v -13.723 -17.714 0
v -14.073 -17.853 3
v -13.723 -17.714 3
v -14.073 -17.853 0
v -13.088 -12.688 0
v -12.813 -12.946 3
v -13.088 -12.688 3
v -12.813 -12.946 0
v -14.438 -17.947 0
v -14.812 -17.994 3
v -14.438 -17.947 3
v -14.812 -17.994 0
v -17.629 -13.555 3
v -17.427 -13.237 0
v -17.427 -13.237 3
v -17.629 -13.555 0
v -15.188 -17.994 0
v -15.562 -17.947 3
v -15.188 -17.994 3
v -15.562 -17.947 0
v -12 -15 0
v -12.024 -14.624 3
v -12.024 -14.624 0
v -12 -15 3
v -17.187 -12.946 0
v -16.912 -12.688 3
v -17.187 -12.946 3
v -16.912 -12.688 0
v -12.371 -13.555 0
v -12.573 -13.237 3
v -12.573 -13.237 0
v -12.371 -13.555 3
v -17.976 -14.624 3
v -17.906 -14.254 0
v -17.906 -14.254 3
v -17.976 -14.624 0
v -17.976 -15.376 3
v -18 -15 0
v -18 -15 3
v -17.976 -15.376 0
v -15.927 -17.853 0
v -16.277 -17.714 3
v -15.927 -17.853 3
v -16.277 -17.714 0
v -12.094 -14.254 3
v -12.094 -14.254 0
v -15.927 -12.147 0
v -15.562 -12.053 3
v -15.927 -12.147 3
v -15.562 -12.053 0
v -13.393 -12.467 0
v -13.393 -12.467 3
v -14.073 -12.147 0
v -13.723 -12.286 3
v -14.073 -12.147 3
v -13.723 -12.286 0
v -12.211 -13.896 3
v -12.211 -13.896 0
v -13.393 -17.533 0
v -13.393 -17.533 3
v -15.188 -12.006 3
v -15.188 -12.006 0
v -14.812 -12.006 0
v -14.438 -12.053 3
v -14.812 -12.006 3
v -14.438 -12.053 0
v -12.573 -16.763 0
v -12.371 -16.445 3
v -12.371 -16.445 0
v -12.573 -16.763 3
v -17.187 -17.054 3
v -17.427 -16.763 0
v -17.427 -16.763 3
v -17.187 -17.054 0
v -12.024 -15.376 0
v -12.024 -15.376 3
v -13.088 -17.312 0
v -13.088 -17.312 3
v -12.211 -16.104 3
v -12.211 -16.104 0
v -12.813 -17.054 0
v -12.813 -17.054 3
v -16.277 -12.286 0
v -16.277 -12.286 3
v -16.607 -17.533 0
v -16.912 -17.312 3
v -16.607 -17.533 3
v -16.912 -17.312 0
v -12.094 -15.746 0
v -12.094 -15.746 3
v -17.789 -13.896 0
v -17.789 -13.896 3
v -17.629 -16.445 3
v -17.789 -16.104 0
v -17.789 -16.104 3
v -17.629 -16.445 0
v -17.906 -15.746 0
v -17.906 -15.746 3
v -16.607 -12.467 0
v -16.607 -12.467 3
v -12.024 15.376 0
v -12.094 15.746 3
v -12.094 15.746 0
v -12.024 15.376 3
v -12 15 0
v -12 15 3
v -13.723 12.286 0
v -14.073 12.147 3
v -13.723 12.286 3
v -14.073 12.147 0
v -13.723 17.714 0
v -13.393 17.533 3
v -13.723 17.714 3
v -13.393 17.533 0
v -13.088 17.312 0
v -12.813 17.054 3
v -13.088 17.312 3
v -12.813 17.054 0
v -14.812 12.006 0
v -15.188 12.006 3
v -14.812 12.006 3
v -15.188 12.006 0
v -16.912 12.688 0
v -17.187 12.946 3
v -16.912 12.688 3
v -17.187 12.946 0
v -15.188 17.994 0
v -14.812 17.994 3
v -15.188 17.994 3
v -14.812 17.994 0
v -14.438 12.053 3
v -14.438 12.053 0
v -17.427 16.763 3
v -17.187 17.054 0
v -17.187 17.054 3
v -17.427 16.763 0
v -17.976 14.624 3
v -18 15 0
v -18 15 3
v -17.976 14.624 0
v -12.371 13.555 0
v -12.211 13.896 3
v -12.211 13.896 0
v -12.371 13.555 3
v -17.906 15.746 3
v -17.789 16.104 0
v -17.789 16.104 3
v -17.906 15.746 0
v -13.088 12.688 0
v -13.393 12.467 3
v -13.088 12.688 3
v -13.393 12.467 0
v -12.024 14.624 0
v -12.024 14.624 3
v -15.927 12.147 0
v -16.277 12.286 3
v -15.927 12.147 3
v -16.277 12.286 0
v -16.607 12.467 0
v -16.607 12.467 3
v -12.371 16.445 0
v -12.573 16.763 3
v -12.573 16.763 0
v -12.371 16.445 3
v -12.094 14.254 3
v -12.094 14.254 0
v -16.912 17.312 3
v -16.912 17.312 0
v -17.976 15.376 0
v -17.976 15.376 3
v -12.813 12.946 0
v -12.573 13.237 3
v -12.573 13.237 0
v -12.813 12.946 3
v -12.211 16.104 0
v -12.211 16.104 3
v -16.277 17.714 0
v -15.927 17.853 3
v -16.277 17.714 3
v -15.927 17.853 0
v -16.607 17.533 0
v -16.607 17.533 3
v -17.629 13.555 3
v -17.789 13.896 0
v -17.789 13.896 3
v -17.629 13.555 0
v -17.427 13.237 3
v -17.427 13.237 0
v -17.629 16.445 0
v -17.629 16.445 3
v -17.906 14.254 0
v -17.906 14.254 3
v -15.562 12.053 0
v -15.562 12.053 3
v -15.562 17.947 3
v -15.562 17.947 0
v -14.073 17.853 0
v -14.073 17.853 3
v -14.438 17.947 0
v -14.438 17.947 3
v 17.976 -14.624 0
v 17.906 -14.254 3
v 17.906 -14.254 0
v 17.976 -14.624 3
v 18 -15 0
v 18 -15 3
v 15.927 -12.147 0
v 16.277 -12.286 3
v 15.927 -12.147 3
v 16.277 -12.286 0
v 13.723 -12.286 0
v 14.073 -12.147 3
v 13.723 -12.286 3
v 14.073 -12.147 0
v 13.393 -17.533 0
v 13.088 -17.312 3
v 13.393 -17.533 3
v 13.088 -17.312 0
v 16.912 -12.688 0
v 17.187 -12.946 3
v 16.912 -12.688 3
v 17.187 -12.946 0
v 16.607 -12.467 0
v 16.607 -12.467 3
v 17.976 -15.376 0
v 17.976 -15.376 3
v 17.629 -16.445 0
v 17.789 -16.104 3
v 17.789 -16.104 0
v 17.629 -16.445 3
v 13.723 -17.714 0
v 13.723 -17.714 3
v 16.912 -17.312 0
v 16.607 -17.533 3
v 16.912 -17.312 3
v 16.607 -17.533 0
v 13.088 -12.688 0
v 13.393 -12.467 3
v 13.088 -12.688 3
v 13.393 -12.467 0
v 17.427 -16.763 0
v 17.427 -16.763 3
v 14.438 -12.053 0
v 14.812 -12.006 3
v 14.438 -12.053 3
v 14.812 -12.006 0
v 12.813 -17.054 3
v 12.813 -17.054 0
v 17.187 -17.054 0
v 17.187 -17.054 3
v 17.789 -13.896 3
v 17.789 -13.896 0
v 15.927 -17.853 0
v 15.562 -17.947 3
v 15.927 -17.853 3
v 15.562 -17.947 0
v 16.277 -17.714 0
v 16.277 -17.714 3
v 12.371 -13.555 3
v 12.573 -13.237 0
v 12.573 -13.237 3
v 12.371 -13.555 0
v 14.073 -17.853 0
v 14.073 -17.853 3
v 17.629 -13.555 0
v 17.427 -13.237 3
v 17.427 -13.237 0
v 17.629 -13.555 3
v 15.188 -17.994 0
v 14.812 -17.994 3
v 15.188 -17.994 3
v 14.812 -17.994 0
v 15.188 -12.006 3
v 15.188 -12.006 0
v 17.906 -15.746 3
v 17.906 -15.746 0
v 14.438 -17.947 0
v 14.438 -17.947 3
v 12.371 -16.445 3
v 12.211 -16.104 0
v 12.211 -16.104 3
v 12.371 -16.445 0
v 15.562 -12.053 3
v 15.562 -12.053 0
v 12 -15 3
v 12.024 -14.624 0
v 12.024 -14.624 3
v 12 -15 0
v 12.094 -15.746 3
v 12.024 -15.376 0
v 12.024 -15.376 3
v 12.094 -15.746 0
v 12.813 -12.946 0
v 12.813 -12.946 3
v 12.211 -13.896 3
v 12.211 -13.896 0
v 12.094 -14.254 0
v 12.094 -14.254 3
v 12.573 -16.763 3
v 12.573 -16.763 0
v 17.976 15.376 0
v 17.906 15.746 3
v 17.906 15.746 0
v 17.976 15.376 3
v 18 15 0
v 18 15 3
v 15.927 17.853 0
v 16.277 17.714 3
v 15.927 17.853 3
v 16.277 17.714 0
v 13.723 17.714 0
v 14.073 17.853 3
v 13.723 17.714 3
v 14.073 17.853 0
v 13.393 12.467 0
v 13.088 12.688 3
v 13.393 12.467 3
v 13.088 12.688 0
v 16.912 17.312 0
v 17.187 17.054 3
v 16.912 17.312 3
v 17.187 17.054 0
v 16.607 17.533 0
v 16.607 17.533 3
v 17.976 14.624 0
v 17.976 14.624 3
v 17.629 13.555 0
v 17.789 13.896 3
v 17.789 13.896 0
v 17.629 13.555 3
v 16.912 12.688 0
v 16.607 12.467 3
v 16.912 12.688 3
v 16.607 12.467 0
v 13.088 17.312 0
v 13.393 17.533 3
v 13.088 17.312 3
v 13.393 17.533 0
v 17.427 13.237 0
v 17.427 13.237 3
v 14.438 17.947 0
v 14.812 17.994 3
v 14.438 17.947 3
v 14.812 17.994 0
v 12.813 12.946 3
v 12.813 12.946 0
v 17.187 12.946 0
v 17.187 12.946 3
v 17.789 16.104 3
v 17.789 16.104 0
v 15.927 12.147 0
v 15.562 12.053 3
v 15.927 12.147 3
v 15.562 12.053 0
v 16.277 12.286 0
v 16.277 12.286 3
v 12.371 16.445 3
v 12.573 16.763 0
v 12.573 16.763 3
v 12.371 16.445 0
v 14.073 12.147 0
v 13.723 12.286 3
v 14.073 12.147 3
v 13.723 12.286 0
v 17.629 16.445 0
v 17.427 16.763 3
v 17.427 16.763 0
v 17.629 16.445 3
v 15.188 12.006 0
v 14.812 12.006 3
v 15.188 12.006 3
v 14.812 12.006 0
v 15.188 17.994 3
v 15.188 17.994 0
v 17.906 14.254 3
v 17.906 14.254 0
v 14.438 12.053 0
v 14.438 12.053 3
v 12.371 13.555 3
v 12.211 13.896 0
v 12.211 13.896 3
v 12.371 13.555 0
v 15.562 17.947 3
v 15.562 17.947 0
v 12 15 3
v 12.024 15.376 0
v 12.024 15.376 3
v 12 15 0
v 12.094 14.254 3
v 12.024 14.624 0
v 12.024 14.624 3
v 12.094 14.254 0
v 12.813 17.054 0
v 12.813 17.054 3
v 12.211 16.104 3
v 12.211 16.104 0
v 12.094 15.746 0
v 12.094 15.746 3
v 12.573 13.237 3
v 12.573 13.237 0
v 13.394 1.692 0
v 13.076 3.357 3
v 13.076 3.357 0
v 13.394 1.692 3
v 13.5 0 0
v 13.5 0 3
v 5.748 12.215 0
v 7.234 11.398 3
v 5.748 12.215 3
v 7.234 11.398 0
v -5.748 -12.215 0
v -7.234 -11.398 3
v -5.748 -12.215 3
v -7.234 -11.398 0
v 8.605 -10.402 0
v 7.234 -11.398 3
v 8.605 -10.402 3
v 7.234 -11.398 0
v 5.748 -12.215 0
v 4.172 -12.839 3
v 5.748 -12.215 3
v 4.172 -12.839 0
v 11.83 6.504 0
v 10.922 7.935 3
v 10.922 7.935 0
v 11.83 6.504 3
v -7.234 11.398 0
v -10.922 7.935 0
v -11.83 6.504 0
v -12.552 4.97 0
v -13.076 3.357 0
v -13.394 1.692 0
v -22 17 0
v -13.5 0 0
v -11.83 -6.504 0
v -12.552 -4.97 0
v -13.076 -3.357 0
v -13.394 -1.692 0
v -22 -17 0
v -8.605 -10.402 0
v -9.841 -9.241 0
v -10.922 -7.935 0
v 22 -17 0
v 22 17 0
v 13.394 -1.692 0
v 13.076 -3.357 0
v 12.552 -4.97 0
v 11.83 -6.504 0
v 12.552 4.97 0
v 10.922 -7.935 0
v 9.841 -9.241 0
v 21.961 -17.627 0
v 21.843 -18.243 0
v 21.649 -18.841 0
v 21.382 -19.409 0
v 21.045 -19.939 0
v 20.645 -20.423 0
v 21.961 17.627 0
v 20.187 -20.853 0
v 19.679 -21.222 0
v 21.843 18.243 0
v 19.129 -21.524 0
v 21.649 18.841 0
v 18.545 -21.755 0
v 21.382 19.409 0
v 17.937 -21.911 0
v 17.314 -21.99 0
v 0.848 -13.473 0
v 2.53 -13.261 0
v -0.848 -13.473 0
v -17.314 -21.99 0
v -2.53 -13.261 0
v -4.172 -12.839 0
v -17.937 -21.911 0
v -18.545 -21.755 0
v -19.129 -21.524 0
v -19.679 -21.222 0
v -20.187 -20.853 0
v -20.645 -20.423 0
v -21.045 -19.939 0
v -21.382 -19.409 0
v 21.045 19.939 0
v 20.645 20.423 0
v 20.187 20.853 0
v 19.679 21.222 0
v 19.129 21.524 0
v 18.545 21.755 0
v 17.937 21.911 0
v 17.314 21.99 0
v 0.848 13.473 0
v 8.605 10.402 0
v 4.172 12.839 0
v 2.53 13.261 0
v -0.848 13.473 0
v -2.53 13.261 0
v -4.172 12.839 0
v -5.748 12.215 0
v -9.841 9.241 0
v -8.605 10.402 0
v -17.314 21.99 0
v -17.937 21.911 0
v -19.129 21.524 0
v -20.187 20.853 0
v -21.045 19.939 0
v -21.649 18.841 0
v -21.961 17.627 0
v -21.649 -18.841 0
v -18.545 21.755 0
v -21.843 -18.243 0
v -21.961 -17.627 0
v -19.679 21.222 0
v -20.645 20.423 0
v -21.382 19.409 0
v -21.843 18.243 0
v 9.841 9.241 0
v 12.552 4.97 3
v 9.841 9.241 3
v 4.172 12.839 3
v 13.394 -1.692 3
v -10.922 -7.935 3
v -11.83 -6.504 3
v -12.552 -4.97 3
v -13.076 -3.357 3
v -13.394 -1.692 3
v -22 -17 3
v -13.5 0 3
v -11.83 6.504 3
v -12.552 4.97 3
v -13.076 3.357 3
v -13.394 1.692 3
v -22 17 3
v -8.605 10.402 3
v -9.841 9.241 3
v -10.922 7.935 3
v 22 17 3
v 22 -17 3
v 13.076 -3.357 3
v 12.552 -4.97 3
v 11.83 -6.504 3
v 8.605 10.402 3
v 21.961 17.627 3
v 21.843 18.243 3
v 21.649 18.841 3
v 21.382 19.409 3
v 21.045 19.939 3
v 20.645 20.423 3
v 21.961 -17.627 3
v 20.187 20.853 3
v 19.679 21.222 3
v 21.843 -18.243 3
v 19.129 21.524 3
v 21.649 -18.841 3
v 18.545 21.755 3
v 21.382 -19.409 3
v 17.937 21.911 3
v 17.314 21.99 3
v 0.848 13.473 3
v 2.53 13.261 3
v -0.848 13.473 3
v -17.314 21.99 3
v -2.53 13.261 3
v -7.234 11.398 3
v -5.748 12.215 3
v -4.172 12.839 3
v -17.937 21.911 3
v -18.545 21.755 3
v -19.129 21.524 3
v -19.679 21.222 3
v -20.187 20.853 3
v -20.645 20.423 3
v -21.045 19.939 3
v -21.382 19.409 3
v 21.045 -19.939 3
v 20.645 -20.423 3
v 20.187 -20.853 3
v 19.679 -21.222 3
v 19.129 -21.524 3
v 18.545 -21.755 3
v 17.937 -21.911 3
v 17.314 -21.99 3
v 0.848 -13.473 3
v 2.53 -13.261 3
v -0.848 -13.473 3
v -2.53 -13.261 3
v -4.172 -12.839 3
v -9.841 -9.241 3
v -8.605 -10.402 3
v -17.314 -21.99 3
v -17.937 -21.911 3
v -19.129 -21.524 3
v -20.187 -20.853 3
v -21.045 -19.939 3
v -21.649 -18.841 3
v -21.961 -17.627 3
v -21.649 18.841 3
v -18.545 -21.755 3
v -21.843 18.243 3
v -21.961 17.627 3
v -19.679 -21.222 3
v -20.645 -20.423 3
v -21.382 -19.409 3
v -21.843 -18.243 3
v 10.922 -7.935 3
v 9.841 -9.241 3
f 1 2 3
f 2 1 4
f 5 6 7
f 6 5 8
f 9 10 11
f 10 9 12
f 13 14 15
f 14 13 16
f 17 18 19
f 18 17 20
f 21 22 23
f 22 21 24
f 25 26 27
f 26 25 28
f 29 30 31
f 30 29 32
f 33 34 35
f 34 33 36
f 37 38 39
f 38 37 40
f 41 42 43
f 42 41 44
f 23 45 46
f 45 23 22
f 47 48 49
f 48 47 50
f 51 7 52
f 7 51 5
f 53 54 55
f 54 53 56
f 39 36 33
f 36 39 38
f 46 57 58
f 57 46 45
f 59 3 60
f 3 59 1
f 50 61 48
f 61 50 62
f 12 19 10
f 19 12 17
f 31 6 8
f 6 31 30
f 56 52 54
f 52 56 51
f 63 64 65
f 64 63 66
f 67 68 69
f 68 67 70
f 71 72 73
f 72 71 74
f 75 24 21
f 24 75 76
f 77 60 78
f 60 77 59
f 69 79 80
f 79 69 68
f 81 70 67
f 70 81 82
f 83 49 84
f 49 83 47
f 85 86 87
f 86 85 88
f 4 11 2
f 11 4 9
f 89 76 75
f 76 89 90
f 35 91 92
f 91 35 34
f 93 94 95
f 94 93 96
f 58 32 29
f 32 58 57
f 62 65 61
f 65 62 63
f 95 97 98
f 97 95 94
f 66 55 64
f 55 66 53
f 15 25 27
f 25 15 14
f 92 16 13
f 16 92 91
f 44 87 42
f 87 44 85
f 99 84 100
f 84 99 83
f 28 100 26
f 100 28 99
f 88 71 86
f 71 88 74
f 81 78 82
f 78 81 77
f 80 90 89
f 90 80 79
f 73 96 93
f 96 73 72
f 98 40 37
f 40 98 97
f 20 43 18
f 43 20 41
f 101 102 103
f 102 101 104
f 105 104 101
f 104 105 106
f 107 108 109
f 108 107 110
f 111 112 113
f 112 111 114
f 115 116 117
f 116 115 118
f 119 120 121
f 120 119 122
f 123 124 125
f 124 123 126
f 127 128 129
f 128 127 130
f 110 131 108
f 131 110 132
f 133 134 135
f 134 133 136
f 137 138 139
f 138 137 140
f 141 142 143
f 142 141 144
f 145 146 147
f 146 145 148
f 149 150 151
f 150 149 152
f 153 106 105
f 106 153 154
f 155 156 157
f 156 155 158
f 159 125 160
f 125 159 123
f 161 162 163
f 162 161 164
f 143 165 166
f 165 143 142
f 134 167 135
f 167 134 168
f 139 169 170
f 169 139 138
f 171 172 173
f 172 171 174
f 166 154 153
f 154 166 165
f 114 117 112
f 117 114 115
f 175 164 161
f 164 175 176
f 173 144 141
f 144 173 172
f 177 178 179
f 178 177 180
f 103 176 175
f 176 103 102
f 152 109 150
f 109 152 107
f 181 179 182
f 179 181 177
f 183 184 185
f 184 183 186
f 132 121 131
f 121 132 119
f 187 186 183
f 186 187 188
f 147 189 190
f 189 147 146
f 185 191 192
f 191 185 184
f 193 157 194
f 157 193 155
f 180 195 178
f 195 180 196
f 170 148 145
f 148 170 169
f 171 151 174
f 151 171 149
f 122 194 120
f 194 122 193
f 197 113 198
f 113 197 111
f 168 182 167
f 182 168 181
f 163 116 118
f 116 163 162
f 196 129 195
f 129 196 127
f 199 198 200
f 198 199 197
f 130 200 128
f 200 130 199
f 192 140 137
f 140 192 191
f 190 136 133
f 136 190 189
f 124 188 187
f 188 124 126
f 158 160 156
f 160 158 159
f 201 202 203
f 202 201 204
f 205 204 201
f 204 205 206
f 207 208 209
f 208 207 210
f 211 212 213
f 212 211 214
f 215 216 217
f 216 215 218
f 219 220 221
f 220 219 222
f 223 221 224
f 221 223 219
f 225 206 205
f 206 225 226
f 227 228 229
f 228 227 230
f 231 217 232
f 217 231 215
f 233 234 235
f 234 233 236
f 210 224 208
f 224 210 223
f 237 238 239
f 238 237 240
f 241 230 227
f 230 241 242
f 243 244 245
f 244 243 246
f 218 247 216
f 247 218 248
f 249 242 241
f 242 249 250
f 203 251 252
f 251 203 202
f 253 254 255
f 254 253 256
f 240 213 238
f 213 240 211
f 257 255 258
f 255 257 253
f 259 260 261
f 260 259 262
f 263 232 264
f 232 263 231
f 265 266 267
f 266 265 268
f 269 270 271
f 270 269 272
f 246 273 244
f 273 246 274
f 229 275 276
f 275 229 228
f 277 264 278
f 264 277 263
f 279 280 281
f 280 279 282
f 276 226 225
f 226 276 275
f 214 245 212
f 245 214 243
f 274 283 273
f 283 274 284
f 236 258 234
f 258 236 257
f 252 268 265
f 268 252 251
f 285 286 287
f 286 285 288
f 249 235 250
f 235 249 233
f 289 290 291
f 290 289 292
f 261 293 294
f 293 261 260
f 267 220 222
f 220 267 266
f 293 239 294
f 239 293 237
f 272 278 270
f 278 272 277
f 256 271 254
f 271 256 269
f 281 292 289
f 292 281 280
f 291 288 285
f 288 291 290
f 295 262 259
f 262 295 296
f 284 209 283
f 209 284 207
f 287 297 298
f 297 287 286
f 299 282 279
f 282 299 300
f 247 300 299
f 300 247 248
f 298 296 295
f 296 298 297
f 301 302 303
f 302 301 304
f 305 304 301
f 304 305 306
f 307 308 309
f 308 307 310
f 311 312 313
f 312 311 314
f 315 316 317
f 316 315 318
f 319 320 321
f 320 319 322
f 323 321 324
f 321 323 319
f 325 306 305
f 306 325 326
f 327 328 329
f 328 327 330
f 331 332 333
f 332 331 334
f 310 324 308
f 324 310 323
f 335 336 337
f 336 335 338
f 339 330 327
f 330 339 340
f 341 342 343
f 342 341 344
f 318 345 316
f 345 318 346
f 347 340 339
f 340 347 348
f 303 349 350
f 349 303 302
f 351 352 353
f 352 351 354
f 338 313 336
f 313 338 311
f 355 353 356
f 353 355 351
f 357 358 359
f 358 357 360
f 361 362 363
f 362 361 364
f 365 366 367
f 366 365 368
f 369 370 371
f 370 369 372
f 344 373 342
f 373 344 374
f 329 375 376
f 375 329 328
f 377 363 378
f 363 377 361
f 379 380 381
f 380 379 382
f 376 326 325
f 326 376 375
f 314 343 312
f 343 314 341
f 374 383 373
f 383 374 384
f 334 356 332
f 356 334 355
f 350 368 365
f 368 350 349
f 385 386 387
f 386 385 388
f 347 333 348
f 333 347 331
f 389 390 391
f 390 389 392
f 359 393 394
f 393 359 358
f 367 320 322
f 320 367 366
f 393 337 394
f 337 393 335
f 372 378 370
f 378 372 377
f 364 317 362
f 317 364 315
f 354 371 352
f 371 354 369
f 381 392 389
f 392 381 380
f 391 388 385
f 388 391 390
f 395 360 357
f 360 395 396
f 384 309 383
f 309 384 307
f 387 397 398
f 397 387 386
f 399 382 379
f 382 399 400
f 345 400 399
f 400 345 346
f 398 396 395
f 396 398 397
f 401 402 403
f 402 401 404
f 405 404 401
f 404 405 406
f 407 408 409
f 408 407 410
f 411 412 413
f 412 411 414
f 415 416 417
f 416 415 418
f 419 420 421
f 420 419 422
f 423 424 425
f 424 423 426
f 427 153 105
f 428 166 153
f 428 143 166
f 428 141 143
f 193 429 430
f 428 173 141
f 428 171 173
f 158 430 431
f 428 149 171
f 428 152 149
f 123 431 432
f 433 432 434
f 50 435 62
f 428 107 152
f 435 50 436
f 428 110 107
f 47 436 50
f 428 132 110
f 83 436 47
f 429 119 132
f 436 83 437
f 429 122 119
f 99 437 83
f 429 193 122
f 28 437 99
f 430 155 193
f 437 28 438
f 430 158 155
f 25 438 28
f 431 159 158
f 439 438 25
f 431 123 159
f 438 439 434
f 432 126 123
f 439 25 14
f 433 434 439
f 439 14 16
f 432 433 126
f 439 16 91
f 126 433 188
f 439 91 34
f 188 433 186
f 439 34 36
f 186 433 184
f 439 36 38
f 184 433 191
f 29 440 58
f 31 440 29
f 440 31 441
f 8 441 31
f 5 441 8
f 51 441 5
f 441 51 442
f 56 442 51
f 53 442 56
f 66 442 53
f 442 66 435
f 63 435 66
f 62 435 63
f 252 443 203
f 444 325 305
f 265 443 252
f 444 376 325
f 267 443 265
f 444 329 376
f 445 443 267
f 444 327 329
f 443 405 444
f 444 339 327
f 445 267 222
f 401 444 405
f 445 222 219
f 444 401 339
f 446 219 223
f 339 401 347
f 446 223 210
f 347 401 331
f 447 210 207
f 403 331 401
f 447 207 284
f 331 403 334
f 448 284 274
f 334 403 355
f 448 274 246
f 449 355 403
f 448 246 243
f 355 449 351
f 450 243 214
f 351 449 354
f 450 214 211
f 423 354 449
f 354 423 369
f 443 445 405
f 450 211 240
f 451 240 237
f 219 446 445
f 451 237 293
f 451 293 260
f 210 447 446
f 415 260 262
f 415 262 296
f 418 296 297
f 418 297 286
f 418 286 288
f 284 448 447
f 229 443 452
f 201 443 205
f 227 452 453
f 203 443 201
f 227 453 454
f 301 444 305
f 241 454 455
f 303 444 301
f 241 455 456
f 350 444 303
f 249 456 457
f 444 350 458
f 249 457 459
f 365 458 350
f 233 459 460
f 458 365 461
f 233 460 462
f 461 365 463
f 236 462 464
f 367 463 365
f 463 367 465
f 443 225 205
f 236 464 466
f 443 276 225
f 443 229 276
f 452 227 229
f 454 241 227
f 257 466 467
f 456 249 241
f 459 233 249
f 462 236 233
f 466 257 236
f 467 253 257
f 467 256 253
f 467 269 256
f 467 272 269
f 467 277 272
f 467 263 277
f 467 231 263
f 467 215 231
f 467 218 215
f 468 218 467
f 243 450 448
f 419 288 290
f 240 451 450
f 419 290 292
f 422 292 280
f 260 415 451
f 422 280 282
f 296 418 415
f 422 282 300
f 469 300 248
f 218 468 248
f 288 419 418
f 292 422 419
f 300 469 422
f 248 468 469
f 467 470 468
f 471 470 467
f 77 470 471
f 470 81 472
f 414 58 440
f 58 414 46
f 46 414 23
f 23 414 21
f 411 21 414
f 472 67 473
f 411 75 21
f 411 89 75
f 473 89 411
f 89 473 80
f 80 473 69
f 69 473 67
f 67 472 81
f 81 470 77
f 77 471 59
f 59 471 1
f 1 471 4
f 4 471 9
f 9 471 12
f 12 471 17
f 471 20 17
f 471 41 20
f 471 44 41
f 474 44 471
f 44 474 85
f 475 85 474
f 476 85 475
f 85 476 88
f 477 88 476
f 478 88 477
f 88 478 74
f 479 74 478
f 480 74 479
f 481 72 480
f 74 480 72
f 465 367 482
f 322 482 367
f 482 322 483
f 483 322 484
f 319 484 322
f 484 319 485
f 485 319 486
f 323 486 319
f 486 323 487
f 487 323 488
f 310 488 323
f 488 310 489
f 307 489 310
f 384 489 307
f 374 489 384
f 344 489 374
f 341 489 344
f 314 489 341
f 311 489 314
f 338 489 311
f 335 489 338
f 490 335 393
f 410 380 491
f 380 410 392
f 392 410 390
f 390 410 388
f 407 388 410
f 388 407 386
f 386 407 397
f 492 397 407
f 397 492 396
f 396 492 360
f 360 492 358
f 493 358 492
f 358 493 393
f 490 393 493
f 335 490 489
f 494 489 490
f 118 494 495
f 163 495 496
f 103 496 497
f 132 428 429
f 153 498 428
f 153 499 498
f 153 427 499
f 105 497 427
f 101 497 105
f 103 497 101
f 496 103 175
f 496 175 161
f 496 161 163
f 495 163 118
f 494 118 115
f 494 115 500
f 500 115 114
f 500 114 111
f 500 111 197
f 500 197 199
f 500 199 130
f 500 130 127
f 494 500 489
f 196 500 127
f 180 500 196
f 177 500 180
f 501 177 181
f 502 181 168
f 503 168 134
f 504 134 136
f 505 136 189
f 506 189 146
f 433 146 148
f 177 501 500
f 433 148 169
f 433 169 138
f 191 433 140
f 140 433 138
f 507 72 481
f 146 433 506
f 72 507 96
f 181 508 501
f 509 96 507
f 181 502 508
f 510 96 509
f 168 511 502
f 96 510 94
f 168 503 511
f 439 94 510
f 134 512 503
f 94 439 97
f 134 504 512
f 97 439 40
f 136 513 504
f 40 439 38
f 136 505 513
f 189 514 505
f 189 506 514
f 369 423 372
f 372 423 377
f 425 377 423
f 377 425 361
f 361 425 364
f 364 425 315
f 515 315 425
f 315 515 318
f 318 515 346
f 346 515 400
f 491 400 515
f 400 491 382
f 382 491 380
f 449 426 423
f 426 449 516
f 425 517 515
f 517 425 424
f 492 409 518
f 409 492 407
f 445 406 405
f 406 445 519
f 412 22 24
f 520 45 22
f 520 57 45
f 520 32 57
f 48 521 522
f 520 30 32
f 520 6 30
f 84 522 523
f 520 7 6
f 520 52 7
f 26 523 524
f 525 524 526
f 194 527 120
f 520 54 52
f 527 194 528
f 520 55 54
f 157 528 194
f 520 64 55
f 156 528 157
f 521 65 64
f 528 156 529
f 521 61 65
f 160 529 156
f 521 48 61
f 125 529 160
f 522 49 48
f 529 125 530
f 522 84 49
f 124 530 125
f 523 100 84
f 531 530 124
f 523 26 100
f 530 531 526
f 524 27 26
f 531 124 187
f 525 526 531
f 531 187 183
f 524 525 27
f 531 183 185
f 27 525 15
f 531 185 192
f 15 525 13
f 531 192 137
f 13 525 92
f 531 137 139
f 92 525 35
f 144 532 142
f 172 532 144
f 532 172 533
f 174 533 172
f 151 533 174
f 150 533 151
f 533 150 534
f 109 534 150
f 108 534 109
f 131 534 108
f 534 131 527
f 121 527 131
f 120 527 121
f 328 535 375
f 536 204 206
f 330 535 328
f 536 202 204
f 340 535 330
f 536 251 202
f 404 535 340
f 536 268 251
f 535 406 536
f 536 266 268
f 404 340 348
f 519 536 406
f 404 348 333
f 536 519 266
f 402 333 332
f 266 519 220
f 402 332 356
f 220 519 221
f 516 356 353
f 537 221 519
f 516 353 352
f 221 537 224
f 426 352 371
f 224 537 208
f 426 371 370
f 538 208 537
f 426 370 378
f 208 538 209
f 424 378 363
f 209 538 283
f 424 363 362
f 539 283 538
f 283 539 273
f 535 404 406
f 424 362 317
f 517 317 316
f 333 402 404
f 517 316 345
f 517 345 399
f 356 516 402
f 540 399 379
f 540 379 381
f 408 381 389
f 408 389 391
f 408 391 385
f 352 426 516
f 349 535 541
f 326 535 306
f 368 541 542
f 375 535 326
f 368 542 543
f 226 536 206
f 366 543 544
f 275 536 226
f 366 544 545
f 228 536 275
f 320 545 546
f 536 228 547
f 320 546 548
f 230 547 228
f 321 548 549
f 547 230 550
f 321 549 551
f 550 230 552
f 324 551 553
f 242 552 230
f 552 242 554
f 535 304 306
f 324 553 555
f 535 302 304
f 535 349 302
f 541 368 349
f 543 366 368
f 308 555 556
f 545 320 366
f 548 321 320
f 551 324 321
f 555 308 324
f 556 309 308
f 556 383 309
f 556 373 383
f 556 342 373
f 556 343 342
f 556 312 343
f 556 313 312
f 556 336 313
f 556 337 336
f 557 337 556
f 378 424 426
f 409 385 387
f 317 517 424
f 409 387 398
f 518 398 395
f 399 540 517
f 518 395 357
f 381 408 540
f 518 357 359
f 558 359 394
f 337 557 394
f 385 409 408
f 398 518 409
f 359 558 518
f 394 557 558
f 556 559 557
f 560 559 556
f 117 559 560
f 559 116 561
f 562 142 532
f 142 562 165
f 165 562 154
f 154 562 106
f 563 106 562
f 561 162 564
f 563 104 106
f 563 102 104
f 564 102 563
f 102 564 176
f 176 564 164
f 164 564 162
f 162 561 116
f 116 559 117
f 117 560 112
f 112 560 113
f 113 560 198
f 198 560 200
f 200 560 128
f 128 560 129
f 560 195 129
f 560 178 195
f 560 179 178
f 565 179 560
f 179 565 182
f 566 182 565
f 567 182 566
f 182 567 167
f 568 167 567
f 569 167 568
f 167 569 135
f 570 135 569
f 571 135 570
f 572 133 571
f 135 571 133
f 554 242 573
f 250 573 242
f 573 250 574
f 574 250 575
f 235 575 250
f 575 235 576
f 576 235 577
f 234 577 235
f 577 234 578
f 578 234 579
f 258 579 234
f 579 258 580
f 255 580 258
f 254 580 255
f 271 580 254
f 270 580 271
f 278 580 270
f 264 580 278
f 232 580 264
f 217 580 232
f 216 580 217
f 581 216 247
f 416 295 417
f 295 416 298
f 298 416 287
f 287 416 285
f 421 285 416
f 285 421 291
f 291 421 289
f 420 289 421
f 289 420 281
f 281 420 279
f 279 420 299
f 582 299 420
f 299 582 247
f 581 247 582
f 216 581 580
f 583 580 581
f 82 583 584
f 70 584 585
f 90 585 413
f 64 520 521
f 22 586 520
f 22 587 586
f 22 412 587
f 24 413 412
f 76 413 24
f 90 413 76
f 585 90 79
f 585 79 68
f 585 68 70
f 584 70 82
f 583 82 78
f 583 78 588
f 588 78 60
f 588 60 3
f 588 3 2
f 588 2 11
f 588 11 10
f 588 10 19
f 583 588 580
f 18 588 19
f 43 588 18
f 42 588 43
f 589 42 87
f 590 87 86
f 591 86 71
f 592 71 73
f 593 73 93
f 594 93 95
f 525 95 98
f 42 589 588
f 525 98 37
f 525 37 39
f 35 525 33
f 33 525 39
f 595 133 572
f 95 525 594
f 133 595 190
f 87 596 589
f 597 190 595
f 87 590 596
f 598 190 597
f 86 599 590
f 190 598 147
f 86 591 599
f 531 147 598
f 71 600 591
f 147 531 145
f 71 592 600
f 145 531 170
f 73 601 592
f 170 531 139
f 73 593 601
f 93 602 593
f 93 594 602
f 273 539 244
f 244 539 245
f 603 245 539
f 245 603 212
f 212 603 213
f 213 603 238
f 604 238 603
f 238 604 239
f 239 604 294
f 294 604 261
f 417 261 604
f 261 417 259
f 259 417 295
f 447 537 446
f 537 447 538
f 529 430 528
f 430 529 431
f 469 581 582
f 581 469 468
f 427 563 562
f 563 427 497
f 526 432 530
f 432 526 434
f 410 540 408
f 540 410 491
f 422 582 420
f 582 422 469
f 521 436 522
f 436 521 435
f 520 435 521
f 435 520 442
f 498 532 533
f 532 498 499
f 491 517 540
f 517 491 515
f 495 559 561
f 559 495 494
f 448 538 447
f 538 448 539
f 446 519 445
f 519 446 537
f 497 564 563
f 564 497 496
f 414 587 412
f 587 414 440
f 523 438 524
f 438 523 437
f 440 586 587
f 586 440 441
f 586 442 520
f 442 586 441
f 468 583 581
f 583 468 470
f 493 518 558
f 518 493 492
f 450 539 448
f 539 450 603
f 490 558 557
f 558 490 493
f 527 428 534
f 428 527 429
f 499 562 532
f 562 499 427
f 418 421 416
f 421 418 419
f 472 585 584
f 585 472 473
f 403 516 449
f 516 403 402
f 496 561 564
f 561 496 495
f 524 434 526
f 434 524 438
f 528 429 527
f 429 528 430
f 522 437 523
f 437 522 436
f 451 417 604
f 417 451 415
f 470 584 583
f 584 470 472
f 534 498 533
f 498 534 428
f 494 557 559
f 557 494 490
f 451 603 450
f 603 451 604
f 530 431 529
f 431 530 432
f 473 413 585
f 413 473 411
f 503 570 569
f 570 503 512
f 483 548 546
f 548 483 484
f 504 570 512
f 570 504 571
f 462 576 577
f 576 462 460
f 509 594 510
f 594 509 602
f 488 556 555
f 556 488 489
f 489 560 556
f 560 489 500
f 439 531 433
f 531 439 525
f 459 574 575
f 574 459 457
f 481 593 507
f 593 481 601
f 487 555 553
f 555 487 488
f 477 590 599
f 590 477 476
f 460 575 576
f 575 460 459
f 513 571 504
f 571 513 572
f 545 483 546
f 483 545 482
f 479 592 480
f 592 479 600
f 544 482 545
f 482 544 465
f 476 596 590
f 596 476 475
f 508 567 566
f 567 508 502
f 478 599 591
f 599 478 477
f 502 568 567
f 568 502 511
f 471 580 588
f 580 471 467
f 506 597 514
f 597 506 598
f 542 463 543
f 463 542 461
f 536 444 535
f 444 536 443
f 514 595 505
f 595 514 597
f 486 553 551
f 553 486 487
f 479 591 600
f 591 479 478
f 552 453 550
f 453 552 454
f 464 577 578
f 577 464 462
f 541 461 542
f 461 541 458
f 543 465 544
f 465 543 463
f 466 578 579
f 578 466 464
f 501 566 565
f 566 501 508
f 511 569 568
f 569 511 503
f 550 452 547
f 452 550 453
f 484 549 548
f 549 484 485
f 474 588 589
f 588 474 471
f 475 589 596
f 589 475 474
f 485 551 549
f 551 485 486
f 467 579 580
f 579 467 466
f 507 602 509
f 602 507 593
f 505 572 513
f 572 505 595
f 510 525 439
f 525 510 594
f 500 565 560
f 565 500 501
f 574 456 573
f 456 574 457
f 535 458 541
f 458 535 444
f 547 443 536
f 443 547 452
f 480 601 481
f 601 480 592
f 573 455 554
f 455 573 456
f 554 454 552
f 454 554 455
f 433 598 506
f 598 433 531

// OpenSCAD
$fn = 50;


difference() {
	union() {
		hull() {
			translate(v = [-17.0000000000, 17.0000000000, 0]) {
				cylinder(h = 3, r = 5);
			}
			translate(v = [17.0000000000, 17.0000000000, 0]) {
				cylinder(h = 3, r = 5);
			}
			translate(v = [-17.0000000000, -17.0000000000, 0]) {
				cylinder(h = 3, r = 5);
			}
			translate(v = [17.0000000000, -17.0000000000, 0]) {
				cylinder(h = 3, r = 5);
			}
		}
	}
	union() {
		#translate(v = [-15.0000000000, -15.0000000000, -100.0000000000]) {
			cylinder(h = 200, r = 3.0000000000);
		}
		#translate(v = [-15.0000000000, 15.0000000000, -100.0000000000]) {
			cylinder(h = 200, r = 3.0000000000);
		}
		#translate(v = [15.0000000000, -15.0000000000, -100.0000000000]) {
			cylinder(h = 200, r = 3.0000000000);
		}
		#translate(v = [15.0000000000, 15.0000000000, -100.0000000000]) {
			cylinder(h = 200, r = 3.0000000000);
		}
		#cylinder(h = 3, r = 13.5000000000);
	}
}
